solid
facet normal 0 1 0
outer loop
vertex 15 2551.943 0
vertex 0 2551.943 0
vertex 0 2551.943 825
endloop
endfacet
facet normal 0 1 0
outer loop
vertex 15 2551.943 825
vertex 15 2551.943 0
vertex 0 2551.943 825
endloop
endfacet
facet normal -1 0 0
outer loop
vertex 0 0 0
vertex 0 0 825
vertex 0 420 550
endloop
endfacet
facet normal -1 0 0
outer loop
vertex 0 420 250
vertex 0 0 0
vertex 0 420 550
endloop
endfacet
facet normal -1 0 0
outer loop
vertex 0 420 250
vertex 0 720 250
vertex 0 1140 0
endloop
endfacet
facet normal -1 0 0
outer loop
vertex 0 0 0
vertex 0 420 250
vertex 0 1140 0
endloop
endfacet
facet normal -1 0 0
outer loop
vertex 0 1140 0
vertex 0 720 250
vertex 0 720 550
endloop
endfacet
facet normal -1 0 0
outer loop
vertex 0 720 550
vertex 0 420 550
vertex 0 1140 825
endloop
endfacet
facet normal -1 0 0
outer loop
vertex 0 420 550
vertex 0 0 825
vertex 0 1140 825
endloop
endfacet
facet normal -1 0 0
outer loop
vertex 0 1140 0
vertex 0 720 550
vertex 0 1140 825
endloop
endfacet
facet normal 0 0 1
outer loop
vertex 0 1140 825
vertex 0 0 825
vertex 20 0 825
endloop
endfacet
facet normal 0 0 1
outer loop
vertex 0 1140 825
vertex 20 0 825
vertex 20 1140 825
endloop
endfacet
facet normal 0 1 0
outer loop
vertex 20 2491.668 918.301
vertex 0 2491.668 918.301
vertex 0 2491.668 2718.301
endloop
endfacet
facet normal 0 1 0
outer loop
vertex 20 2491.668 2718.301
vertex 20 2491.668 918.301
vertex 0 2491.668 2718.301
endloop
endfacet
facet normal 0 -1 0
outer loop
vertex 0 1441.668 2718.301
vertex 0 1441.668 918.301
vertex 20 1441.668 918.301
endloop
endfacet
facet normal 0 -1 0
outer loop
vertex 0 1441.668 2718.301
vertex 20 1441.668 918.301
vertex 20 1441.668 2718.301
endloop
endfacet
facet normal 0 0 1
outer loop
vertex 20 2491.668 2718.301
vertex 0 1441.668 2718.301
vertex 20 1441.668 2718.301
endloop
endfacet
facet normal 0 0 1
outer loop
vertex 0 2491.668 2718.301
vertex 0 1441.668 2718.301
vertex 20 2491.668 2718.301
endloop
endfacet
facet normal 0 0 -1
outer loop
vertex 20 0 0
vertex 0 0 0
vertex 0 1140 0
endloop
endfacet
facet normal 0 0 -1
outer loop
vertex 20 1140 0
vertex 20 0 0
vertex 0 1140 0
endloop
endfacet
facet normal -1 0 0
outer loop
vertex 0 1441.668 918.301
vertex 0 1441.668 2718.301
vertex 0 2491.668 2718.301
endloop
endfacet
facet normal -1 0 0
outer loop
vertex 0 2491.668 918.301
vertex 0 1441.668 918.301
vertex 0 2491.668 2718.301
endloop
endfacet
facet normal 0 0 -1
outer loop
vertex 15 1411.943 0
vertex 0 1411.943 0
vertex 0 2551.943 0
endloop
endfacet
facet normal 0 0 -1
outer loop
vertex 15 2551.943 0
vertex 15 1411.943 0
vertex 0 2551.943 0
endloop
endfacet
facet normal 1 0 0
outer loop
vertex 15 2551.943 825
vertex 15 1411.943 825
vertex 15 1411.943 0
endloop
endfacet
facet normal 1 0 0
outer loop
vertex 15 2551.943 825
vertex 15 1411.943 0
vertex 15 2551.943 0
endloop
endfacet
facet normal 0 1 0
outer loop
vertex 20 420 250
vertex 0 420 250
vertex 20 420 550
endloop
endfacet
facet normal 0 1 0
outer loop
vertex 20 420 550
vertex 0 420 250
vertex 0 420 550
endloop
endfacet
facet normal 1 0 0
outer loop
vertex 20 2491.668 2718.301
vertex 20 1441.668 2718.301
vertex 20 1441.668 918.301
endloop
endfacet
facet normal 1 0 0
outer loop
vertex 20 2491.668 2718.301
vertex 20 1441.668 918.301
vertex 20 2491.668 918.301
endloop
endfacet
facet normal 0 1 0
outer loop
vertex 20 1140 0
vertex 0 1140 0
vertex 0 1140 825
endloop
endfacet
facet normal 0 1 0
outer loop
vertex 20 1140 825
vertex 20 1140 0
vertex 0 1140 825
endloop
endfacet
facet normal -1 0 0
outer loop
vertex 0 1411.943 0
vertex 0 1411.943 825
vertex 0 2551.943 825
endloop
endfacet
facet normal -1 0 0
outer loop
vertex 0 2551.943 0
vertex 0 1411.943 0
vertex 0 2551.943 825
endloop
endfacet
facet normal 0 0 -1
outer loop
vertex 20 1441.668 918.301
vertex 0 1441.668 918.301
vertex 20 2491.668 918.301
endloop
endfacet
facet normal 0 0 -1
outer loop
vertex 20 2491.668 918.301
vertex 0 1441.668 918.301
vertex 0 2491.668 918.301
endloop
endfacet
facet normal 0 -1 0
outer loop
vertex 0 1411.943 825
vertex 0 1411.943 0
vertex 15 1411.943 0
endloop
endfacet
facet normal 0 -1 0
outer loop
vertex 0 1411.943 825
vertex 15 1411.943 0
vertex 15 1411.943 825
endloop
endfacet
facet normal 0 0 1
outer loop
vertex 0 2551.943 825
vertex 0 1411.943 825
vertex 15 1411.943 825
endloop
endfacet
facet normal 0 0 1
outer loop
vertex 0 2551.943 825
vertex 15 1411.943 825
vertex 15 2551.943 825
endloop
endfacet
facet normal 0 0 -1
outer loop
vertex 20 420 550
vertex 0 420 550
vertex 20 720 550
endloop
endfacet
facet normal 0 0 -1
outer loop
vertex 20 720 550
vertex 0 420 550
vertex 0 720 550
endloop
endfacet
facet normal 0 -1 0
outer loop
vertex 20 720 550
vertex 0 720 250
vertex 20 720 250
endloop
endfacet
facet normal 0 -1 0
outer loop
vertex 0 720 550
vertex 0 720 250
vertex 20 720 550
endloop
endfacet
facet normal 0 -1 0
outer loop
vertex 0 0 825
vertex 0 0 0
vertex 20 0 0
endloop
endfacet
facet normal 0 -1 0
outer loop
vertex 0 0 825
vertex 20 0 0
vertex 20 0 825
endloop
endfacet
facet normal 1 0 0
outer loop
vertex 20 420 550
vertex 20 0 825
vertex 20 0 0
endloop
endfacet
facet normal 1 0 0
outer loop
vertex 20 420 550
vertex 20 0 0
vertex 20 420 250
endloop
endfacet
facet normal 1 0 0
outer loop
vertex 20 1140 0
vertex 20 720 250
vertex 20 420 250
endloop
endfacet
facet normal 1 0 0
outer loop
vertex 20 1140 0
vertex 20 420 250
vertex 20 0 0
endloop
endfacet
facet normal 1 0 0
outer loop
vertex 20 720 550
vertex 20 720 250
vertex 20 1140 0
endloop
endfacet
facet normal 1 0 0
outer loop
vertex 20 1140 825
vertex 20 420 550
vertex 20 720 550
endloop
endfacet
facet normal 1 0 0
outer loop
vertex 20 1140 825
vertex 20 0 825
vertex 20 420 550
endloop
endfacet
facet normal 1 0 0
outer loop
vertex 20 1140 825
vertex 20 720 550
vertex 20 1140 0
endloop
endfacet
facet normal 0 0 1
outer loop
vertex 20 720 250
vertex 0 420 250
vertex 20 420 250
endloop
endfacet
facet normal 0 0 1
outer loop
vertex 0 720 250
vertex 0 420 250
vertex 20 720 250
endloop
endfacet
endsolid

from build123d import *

# Parameters (mm, degrees)
F0_W     = 1140
F0_H     = 825
F0_W_2   = 300
F0_H_2   = 300
F1_DEPTH = 20
F2_W     = 1140
F2_H     = 825
F3_DEPTH = 15
F4_W     = 1050
F4_H     = 1800
F5_DEPTH = 20


with BuildPart() as f1:
    # F0 (on Right) → F1 (new body)
    with BuildSketch(Plane.YZ):
        with Locations((570, 412.5)):
            Rectangle(F0_W, F0_H)
        with Locations((570, 400)):
            Rectangle(F0_W_2, F0_H_2, mode=Mode.SUBTRACT)
    extrude(amount=F1_DEPTH)


with BuildPart() as f3:
    # F2 (on Right) → F3 (new body)
    with BuildSketch(Plane.YZ):
        with Locations((1981.942606, 412.5)):
            Rectangle(F2_W, F2_H)
    extrude(amount=F3_DEPTH)


with BuildPart() as f5:
    # F4 (on Right) → F5 (new body)
    with BuildSketch(Plane.YZ):
        with Locations((1966.667557, 1818.301301)):
            Rectangle(F4_W, F4_H)
    extrude(amount=F5_DEPTH)


solid = Compound([f1.part, f3.part, f5.part])
